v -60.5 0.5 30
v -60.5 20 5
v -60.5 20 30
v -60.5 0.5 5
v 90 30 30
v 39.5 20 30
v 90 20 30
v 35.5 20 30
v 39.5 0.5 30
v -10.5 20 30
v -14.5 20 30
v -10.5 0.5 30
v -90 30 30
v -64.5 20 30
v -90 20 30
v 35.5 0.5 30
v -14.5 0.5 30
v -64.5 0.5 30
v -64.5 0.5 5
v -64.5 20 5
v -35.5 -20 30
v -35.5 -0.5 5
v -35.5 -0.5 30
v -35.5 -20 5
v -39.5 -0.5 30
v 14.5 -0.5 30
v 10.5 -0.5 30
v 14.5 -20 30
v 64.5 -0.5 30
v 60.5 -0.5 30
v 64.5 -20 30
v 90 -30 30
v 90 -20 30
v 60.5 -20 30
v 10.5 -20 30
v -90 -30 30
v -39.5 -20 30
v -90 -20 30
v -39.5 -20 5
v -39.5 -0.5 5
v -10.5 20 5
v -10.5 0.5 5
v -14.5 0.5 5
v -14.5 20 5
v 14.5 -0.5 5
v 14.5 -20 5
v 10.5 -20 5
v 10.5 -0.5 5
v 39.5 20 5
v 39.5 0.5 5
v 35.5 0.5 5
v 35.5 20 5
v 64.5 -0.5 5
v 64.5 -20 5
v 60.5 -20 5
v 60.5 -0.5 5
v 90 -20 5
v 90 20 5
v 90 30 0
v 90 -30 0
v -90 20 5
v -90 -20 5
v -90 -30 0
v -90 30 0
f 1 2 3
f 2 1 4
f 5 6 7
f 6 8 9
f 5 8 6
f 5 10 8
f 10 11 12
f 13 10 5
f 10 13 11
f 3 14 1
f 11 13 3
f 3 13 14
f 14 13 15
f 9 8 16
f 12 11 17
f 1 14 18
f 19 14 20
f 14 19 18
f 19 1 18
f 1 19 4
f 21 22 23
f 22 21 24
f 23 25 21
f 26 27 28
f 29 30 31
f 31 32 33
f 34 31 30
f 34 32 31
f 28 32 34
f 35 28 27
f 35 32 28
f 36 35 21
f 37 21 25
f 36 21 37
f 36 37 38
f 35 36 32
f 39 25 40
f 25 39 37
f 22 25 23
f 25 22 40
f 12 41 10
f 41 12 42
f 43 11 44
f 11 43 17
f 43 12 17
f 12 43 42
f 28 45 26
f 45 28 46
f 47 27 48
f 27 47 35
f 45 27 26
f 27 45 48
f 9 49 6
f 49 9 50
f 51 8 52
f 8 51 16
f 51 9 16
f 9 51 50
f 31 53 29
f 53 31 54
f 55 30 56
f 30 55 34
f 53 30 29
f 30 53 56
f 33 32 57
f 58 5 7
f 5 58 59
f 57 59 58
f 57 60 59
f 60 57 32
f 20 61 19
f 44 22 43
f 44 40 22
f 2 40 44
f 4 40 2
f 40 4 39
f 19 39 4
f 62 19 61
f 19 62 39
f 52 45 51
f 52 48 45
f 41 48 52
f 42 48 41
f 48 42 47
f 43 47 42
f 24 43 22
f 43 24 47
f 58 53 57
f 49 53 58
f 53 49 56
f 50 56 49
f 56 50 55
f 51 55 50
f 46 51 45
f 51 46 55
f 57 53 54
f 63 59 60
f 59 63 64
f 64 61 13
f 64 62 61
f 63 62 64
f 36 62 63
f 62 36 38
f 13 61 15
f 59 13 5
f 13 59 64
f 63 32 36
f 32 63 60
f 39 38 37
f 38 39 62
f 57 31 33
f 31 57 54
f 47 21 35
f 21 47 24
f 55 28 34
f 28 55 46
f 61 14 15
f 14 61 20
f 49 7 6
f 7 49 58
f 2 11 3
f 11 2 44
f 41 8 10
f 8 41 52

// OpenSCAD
$fn = 32;

// ----------------------------------------------------------------------
// Rib frame 180 x 60 x 30
// 6 ribs at 25 mm pitch, staggered
// ----------------------------------------------------------------------

// --- parameters (mm) ---
frame = [180, 60, 5];  // base plate size (x, y, z)
rail_w = 10;           // side rail width
ribs = 6;              // number of ribs
rib_t = 4;             // rib thickness
rib_h = 25;            // rib height above the base plate
pitch = 25;            // pitch between rib centres

// --- derived feature positions (mm) ---
span = (ribs - 1) * pitch;          // = 125   distance between the outer ribs
origin_x = -span / 2;               // = -62.5   X of the first rib
rib_len = frame[1] / 2 - rail_w + 0.5;  // = 20.5   length of a staggered rib
rib_y = 0.5 + rib_len / 2;          // = 10.75   Y of a staggered rib centre
row_offset = 2 * rib_y;             // = 21.5   distance between the two rows
feature_centers = [
  [origin_x + 0 * pitch, rib_y],
  [origin_x + 1 * pitch, -rib_y],
  [origin_x + 2 * pitch, rib_y],
  [origin_x + 3 * pitch, -rib_y],
  [origin_x + 4 * pitch, rib_y],
  [origin_x + 5 * pitch, -rib_y]
];   // rib centre line, drives the rib loop

// base plate, two side rails, then the ribs read straight off feature_centers
union() {
  translate([-frame[0] / 2, -frame[1] / 2, 0]) cube(frame);
  translate([-frame[0] / 2, -frame[1] / 2, 0]) cube([frame[0], rail_w, frame[2] + rib_h]);
  translate([-frame[0] / 2, frame[1] / 2 - rail_w, 0]) cube([frame[0], rail_w, frame[2] + rib_h]);
  for (centre = feature_centers)
    translate([centre[0] - rib_t / 2, centre[1] - rib_len / 2, frame[2] - 1])
      cube([rib_t, rib_len, rib_h + 1]);
}
